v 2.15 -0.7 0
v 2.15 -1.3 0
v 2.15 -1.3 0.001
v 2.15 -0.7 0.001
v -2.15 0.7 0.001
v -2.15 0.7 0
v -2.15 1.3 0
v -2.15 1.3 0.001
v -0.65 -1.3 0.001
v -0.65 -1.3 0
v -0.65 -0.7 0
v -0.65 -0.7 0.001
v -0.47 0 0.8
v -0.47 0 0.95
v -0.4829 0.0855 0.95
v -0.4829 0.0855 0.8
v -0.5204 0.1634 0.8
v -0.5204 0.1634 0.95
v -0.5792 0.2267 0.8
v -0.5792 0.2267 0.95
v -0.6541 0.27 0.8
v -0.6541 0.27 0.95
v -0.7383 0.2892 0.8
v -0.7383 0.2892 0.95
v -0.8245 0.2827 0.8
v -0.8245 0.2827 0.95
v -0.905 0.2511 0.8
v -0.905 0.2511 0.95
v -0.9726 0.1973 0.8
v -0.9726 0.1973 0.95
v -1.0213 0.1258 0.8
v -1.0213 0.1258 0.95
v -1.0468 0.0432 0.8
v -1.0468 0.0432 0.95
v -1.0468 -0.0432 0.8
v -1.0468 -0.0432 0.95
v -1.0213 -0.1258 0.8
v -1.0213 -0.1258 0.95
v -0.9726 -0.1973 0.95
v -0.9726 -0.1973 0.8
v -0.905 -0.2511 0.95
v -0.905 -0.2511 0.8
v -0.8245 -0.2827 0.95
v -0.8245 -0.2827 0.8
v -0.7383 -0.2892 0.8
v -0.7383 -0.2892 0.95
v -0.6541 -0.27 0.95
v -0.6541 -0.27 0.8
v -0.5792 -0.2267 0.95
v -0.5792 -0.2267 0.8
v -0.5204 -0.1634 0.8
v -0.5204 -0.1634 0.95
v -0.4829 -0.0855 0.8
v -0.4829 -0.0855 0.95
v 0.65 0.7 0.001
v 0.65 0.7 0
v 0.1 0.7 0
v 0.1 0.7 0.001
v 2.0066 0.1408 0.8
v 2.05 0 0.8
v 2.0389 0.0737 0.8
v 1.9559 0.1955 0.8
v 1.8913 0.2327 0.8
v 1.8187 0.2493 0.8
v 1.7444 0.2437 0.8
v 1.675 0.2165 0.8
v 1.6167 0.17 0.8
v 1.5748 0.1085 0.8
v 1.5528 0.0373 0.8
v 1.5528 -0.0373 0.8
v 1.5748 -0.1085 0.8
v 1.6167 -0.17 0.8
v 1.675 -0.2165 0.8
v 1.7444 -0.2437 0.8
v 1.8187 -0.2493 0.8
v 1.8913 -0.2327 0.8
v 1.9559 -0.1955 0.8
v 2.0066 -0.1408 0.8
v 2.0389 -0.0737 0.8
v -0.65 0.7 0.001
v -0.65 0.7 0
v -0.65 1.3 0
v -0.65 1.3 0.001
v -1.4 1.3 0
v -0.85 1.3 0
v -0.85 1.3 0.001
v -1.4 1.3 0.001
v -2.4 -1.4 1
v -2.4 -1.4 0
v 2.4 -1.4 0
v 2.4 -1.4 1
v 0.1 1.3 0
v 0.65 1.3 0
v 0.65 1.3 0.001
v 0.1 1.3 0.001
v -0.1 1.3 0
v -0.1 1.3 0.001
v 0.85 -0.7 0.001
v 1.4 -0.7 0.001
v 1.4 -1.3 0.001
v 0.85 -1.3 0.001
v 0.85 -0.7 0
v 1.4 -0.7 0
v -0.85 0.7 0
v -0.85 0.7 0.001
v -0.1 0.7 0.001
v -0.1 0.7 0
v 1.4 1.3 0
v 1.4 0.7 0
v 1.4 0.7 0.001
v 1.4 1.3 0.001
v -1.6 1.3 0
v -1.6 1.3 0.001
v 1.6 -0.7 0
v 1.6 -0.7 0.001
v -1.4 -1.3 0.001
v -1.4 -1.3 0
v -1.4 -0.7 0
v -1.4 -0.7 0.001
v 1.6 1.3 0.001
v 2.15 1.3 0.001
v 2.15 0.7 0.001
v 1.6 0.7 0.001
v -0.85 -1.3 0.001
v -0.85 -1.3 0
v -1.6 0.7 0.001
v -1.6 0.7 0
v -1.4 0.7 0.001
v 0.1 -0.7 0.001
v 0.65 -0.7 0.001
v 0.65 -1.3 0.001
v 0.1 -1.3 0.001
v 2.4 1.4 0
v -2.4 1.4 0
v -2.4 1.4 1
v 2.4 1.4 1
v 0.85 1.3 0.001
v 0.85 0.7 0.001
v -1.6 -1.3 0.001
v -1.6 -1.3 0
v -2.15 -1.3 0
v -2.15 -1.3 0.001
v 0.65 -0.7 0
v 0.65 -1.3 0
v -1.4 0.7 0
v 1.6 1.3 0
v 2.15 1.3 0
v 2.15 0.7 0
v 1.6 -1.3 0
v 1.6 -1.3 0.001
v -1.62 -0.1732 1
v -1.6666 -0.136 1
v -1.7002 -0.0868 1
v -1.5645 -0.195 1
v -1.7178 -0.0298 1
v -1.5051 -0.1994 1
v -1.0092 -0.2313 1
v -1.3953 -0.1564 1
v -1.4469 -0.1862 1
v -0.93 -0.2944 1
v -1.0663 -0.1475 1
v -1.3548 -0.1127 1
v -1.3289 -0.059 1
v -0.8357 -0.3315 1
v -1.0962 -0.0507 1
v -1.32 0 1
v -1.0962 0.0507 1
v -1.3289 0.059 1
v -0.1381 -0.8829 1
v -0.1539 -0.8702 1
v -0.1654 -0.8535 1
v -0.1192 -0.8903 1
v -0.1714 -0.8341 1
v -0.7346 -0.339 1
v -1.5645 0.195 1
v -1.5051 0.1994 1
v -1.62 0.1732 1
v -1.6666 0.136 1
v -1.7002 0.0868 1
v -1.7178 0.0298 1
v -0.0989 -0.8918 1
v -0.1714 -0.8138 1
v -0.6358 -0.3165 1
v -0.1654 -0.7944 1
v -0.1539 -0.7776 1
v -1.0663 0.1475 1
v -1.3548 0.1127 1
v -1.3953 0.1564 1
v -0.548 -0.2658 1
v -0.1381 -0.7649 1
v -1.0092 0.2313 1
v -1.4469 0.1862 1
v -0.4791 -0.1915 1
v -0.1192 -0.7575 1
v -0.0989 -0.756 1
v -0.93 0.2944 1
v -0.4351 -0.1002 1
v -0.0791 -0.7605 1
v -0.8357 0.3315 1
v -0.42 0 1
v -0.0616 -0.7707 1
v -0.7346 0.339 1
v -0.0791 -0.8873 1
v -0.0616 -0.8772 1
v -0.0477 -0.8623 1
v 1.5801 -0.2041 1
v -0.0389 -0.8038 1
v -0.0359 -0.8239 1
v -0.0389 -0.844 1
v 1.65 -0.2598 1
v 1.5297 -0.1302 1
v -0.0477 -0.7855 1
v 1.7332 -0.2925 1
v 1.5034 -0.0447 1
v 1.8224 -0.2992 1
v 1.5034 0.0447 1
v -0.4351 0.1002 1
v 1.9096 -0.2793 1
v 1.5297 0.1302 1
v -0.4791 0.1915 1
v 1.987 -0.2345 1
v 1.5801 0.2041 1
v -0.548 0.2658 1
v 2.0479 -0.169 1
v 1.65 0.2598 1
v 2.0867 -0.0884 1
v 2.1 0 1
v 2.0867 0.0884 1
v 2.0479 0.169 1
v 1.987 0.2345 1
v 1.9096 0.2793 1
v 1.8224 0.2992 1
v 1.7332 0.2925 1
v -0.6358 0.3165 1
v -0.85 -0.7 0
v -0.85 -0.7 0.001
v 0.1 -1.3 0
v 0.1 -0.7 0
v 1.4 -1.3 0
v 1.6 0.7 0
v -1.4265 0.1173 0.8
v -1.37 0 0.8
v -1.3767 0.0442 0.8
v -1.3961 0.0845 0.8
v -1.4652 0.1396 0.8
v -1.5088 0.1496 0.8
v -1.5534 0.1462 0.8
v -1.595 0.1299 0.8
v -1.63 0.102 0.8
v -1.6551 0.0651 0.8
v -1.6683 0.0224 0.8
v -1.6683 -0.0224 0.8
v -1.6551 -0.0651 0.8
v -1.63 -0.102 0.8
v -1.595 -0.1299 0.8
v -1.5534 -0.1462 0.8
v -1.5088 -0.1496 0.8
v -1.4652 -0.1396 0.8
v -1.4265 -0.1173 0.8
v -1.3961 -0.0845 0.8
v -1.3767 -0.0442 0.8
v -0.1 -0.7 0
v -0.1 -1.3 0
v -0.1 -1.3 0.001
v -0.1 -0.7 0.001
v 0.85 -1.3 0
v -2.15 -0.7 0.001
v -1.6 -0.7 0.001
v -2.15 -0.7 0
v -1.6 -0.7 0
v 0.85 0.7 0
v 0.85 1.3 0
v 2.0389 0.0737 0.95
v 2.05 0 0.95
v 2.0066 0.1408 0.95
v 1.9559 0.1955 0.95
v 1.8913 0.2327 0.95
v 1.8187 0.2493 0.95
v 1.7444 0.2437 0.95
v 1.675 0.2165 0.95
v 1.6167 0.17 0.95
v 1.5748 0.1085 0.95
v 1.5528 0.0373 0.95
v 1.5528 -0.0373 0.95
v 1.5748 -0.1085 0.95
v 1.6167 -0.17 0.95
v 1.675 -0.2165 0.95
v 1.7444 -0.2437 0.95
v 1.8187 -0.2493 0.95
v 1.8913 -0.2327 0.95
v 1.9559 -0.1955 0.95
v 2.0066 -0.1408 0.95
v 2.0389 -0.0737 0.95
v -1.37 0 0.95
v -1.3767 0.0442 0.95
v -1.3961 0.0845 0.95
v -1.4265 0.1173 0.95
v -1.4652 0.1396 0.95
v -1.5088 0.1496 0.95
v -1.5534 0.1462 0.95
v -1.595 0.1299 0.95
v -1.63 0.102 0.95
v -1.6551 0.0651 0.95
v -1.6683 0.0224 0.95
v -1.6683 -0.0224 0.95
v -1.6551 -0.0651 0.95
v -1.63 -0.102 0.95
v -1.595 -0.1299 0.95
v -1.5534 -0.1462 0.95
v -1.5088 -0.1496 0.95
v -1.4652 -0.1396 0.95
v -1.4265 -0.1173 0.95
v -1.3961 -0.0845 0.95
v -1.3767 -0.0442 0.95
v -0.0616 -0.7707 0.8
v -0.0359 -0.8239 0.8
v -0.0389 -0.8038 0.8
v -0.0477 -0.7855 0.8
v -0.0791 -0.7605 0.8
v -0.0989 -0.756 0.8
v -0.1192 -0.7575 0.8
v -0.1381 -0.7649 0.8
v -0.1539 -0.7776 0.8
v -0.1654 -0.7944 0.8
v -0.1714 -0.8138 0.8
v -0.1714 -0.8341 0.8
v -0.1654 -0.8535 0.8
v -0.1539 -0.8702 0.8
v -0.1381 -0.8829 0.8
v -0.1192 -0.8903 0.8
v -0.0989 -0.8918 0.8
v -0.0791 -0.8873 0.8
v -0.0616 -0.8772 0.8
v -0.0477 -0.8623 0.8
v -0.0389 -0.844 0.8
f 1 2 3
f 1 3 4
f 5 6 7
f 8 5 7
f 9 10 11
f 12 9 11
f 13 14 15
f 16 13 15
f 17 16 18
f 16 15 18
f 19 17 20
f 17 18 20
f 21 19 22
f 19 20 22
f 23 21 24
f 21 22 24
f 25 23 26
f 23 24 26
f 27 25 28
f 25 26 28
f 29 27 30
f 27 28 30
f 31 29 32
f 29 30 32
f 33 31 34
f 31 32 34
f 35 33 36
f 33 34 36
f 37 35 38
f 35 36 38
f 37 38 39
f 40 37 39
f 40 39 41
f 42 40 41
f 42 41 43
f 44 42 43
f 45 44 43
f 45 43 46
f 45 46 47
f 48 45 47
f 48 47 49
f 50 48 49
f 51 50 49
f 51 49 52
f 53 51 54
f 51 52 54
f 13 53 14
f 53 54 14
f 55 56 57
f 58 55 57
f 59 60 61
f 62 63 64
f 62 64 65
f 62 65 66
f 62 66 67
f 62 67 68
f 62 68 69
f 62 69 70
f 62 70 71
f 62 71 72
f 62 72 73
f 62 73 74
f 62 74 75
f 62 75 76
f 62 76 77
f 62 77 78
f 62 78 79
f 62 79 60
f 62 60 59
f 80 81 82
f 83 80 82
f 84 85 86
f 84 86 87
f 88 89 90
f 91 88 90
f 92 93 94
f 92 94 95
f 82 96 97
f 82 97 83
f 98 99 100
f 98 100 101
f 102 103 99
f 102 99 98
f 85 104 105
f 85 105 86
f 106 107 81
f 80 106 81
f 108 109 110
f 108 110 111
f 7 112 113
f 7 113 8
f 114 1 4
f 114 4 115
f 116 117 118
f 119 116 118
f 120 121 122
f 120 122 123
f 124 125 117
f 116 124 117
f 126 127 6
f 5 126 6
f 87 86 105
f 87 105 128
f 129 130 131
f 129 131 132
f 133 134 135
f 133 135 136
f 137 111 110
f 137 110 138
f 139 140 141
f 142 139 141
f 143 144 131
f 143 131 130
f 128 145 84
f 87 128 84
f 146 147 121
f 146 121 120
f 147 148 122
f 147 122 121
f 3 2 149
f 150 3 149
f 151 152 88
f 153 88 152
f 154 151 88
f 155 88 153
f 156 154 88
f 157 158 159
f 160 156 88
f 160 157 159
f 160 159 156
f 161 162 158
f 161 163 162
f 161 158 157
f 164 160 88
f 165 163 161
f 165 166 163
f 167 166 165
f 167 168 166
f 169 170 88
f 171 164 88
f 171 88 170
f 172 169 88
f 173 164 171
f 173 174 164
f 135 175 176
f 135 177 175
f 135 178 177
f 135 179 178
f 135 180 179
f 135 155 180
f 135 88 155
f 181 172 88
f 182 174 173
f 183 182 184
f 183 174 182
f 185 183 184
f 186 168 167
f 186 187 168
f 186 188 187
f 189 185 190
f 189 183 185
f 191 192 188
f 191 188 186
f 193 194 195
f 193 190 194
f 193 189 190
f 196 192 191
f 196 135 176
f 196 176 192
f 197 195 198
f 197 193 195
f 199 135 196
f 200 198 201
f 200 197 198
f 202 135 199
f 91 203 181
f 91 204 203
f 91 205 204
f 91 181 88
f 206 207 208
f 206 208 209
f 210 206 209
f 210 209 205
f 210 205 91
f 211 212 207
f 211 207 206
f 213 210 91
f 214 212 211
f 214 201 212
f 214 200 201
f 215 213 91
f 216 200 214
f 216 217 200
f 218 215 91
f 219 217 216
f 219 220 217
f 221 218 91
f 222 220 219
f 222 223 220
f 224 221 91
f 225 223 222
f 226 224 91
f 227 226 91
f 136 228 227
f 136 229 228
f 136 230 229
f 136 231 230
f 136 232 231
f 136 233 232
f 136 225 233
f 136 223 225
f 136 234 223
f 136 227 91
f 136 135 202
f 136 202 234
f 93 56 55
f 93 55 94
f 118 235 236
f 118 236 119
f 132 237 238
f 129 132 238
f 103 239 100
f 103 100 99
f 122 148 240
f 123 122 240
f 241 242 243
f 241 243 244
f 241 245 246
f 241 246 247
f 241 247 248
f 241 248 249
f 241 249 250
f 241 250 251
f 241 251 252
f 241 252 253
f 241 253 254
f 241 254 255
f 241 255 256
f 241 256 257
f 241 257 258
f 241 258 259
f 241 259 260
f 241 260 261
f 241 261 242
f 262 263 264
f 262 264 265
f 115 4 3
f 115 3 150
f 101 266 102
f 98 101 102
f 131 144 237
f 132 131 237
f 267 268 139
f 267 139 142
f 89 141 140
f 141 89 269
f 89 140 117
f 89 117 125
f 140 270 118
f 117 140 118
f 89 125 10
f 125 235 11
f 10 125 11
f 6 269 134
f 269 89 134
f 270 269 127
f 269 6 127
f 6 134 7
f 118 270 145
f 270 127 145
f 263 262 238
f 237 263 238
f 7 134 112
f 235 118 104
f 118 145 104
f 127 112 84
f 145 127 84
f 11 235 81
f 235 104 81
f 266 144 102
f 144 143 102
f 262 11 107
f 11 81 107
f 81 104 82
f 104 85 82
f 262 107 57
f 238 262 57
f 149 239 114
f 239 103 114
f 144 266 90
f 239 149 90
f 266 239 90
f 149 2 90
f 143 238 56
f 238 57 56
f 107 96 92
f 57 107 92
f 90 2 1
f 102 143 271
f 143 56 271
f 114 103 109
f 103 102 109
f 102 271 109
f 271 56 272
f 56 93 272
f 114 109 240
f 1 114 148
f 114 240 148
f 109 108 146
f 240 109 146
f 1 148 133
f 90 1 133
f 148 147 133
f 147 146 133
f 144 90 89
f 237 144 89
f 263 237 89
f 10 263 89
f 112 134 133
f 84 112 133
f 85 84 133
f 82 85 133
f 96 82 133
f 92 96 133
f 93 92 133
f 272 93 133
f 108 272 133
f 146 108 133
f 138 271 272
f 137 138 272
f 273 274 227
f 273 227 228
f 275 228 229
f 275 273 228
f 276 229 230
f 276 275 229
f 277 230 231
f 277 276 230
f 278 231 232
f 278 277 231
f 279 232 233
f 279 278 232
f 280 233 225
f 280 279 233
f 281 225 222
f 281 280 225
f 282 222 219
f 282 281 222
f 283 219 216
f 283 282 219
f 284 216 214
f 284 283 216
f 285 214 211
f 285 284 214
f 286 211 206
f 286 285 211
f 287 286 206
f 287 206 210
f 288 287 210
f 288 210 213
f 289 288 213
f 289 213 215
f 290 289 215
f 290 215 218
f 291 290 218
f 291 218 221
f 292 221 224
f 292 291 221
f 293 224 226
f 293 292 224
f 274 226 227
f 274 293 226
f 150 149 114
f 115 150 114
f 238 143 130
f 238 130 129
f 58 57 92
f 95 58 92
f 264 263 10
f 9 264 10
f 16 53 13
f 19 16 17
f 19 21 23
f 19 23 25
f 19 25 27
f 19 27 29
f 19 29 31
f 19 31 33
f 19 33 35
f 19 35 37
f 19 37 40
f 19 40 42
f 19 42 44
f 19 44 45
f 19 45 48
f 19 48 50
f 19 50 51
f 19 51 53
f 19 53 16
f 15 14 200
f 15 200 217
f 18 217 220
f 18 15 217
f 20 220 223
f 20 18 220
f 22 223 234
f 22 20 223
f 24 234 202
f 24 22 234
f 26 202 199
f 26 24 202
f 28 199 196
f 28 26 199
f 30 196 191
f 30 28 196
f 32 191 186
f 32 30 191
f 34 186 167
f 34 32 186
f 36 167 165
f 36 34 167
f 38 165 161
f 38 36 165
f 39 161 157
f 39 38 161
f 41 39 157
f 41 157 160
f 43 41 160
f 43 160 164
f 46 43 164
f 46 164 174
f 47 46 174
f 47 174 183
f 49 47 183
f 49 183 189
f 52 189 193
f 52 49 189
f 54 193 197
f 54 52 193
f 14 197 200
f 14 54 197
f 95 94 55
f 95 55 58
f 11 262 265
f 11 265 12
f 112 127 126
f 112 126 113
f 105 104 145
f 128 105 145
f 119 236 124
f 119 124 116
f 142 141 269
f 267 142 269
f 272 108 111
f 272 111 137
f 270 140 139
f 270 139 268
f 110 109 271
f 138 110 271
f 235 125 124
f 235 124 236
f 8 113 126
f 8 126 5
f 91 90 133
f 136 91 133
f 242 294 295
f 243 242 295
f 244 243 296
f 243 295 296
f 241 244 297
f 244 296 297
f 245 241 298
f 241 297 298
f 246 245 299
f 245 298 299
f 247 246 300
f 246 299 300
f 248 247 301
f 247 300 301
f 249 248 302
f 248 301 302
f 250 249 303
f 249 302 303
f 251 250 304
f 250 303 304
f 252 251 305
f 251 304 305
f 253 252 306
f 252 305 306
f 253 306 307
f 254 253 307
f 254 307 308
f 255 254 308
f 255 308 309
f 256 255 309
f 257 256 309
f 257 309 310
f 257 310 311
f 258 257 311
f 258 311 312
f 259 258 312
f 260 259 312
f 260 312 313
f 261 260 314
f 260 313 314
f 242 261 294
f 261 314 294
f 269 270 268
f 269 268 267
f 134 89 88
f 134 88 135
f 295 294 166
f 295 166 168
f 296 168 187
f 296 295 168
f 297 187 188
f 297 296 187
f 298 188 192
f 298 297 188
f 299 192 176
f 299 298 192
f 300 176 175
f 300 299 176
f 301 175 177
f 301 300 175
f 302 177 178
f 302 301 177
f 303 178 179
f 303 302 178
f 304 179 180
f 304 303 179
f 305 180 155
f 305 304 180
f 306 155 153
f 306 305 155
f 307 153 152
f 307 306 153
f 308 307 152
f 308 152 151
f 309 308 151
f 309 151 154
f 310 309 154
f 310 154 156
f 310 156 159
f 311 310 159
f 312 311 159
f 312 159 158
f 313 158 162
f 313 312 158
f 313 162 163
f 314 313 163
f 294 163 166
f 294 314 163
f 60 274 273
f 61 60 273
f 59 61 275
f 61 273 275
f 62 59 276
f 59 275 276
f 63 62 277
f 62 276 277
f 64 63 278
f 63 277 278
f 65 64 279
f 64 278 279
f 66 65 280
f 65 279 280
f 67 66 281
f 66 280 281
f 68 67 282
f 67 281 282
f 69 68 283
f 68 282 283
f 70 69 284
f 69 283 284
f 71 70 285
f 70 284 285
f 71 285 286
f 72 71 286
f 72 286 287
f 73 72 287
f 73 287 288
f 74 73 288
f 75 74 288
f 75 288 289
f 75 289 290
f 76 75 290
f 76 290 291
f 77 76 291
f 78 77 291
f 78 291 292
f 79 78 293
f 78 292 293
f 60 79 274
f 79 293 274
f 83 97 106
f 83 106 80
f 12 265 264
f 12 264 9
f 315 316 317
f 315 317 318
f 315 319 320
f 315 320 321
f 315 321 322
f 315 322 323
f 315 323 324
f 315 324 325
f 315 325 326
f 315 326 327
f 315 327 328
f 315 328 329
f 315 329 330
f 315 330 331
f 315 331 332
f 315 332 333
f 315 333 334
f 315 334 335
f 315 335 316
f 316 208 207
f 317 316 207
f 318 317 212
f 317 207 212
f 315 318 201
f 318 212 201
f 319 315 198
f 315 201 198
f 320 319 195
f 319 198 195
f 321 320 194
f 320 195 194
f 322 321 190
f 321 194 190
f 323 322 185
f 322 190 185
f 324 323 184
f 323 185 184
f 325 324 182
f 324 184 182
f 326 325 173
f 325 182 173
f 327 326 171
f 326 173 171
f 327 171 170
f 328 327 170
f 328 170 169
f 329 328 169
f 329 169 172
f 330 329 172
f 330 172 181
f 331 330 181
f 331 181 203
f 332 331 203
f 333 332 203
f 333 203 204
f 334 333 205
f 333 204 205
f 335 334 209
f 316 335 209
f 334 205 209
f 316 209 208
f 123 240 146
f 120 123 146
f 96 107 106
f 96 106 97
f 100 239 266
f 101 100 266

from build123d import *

# Parameters (mm, degrees)
SKETCH1_W           = 4.8
SKETCH1_H           = 2.8
BOSS_EXTRUDE1_DEPTH = 1
SKETCH2_R           = 0.25
SKETCH2_R_2         = 0.068106799
SKETCH2_R_3         = 0.29
SKETCH2_R_4         = 0.15
CUT_EXTRUDE1_DEPTH  = 0.2
CHAMFER1_SIZE       = 0.05
SKETCH3_W           = 0.55
SKETCH3_H           = 0.6
CUT_EXTRUDE2_DEPTH  = 0.001


with BuildPart() as part:
    # Sketch1 → Boss-Extrude1 (new body)
    with BuildSketch(Plane.XY):
        Rectangle(SKETCH1_W, SKETCH1_H)
    extrude(amount=BOSS_EXTRUDE1_DEPTH)

    # Sketch2 → Cut-Extrude1 (cut)
    with BuildSketch(Plane.XY.offset(1)):
        with Locations((1.8, 0)):
            Circle(SKETCH2_R)
        with Locations((-0.104016801, -0.823903451)):
            Circle(SKETCH2_R_2)
        with Locations((-0.76, 0)):
            Circle(SKETCH2_R_3)
        with Locations((-1.52, 0)):
            Circle(SKETCH2_R_4)
    extrude(amount=-CUT_EXTRUDE1_DEPTH, mode=Mode.SUBTRACT)

    # Chamfer1
    chamfer1_edges = [part.edges().sort_by_distance(p)[0] for p in [
        (1.55, 0, 1),
        (-1.05, 0, 1),
        (-1.67, 0, 1),
    ]]
    chamfer(chamfer1_edges, length=CHAMFER1_SIZE)

    # Sketch3 → Cut-Extrude2 (cut)
    with BuildSketch(Plane(origin=(0, 0, 0), x_dir=(-1, 0, 0), z_dir=(0, 0, -1))):
        with Locations((1.875, -1)):
            Rectangle(SKETCH3_W, SKETCH3_H)
        with Locations((1.125, -1)):
            Rectangle(SKETCH3_W, SKETCH3_H)
        with Locations((0.375, -1)):
            Rectangle(SKETCH3_W, SKETCH3_H)
        with Locations((-0.375, -1)):
            Rectangle(SKETCH3_W, SKETCH3_H)
        with Locations((-1.125, -1)):
            Rectangle(SKETCH3_W, SKETCH3_H)
        with Locations((-1.875, -1)):
            Rectangle(SKETCH3_W, SKETCH3_H)
        with Locations((1.125, 1)):
            Rectangle(SKETCH3_W, SKETCH3_H)
        with Locations((0.375, 1)):
            Rectangle(SKETCH3_W, SKETCH3_H)
        with Locations((-0.375, 1)):
            Rectangle(SKETCH3_W, SKETCH3_H)
        with Locations((-1.125, 1)):
            Rectangle(SKETCH3_W, SKETCH3_H)
        with Locations((-1.875, 1)):
            Rectangle(SKETCH3_W, SKETCH3_H)
        with Locations((1.875, 1)):
            Rectangle(SKETCH3_W, SKETCH3_H)
    extrude(amount=-CUT_EXTRUDE2_DEPTH, mode=Mode.SUBTRACT)


solid = part.part
